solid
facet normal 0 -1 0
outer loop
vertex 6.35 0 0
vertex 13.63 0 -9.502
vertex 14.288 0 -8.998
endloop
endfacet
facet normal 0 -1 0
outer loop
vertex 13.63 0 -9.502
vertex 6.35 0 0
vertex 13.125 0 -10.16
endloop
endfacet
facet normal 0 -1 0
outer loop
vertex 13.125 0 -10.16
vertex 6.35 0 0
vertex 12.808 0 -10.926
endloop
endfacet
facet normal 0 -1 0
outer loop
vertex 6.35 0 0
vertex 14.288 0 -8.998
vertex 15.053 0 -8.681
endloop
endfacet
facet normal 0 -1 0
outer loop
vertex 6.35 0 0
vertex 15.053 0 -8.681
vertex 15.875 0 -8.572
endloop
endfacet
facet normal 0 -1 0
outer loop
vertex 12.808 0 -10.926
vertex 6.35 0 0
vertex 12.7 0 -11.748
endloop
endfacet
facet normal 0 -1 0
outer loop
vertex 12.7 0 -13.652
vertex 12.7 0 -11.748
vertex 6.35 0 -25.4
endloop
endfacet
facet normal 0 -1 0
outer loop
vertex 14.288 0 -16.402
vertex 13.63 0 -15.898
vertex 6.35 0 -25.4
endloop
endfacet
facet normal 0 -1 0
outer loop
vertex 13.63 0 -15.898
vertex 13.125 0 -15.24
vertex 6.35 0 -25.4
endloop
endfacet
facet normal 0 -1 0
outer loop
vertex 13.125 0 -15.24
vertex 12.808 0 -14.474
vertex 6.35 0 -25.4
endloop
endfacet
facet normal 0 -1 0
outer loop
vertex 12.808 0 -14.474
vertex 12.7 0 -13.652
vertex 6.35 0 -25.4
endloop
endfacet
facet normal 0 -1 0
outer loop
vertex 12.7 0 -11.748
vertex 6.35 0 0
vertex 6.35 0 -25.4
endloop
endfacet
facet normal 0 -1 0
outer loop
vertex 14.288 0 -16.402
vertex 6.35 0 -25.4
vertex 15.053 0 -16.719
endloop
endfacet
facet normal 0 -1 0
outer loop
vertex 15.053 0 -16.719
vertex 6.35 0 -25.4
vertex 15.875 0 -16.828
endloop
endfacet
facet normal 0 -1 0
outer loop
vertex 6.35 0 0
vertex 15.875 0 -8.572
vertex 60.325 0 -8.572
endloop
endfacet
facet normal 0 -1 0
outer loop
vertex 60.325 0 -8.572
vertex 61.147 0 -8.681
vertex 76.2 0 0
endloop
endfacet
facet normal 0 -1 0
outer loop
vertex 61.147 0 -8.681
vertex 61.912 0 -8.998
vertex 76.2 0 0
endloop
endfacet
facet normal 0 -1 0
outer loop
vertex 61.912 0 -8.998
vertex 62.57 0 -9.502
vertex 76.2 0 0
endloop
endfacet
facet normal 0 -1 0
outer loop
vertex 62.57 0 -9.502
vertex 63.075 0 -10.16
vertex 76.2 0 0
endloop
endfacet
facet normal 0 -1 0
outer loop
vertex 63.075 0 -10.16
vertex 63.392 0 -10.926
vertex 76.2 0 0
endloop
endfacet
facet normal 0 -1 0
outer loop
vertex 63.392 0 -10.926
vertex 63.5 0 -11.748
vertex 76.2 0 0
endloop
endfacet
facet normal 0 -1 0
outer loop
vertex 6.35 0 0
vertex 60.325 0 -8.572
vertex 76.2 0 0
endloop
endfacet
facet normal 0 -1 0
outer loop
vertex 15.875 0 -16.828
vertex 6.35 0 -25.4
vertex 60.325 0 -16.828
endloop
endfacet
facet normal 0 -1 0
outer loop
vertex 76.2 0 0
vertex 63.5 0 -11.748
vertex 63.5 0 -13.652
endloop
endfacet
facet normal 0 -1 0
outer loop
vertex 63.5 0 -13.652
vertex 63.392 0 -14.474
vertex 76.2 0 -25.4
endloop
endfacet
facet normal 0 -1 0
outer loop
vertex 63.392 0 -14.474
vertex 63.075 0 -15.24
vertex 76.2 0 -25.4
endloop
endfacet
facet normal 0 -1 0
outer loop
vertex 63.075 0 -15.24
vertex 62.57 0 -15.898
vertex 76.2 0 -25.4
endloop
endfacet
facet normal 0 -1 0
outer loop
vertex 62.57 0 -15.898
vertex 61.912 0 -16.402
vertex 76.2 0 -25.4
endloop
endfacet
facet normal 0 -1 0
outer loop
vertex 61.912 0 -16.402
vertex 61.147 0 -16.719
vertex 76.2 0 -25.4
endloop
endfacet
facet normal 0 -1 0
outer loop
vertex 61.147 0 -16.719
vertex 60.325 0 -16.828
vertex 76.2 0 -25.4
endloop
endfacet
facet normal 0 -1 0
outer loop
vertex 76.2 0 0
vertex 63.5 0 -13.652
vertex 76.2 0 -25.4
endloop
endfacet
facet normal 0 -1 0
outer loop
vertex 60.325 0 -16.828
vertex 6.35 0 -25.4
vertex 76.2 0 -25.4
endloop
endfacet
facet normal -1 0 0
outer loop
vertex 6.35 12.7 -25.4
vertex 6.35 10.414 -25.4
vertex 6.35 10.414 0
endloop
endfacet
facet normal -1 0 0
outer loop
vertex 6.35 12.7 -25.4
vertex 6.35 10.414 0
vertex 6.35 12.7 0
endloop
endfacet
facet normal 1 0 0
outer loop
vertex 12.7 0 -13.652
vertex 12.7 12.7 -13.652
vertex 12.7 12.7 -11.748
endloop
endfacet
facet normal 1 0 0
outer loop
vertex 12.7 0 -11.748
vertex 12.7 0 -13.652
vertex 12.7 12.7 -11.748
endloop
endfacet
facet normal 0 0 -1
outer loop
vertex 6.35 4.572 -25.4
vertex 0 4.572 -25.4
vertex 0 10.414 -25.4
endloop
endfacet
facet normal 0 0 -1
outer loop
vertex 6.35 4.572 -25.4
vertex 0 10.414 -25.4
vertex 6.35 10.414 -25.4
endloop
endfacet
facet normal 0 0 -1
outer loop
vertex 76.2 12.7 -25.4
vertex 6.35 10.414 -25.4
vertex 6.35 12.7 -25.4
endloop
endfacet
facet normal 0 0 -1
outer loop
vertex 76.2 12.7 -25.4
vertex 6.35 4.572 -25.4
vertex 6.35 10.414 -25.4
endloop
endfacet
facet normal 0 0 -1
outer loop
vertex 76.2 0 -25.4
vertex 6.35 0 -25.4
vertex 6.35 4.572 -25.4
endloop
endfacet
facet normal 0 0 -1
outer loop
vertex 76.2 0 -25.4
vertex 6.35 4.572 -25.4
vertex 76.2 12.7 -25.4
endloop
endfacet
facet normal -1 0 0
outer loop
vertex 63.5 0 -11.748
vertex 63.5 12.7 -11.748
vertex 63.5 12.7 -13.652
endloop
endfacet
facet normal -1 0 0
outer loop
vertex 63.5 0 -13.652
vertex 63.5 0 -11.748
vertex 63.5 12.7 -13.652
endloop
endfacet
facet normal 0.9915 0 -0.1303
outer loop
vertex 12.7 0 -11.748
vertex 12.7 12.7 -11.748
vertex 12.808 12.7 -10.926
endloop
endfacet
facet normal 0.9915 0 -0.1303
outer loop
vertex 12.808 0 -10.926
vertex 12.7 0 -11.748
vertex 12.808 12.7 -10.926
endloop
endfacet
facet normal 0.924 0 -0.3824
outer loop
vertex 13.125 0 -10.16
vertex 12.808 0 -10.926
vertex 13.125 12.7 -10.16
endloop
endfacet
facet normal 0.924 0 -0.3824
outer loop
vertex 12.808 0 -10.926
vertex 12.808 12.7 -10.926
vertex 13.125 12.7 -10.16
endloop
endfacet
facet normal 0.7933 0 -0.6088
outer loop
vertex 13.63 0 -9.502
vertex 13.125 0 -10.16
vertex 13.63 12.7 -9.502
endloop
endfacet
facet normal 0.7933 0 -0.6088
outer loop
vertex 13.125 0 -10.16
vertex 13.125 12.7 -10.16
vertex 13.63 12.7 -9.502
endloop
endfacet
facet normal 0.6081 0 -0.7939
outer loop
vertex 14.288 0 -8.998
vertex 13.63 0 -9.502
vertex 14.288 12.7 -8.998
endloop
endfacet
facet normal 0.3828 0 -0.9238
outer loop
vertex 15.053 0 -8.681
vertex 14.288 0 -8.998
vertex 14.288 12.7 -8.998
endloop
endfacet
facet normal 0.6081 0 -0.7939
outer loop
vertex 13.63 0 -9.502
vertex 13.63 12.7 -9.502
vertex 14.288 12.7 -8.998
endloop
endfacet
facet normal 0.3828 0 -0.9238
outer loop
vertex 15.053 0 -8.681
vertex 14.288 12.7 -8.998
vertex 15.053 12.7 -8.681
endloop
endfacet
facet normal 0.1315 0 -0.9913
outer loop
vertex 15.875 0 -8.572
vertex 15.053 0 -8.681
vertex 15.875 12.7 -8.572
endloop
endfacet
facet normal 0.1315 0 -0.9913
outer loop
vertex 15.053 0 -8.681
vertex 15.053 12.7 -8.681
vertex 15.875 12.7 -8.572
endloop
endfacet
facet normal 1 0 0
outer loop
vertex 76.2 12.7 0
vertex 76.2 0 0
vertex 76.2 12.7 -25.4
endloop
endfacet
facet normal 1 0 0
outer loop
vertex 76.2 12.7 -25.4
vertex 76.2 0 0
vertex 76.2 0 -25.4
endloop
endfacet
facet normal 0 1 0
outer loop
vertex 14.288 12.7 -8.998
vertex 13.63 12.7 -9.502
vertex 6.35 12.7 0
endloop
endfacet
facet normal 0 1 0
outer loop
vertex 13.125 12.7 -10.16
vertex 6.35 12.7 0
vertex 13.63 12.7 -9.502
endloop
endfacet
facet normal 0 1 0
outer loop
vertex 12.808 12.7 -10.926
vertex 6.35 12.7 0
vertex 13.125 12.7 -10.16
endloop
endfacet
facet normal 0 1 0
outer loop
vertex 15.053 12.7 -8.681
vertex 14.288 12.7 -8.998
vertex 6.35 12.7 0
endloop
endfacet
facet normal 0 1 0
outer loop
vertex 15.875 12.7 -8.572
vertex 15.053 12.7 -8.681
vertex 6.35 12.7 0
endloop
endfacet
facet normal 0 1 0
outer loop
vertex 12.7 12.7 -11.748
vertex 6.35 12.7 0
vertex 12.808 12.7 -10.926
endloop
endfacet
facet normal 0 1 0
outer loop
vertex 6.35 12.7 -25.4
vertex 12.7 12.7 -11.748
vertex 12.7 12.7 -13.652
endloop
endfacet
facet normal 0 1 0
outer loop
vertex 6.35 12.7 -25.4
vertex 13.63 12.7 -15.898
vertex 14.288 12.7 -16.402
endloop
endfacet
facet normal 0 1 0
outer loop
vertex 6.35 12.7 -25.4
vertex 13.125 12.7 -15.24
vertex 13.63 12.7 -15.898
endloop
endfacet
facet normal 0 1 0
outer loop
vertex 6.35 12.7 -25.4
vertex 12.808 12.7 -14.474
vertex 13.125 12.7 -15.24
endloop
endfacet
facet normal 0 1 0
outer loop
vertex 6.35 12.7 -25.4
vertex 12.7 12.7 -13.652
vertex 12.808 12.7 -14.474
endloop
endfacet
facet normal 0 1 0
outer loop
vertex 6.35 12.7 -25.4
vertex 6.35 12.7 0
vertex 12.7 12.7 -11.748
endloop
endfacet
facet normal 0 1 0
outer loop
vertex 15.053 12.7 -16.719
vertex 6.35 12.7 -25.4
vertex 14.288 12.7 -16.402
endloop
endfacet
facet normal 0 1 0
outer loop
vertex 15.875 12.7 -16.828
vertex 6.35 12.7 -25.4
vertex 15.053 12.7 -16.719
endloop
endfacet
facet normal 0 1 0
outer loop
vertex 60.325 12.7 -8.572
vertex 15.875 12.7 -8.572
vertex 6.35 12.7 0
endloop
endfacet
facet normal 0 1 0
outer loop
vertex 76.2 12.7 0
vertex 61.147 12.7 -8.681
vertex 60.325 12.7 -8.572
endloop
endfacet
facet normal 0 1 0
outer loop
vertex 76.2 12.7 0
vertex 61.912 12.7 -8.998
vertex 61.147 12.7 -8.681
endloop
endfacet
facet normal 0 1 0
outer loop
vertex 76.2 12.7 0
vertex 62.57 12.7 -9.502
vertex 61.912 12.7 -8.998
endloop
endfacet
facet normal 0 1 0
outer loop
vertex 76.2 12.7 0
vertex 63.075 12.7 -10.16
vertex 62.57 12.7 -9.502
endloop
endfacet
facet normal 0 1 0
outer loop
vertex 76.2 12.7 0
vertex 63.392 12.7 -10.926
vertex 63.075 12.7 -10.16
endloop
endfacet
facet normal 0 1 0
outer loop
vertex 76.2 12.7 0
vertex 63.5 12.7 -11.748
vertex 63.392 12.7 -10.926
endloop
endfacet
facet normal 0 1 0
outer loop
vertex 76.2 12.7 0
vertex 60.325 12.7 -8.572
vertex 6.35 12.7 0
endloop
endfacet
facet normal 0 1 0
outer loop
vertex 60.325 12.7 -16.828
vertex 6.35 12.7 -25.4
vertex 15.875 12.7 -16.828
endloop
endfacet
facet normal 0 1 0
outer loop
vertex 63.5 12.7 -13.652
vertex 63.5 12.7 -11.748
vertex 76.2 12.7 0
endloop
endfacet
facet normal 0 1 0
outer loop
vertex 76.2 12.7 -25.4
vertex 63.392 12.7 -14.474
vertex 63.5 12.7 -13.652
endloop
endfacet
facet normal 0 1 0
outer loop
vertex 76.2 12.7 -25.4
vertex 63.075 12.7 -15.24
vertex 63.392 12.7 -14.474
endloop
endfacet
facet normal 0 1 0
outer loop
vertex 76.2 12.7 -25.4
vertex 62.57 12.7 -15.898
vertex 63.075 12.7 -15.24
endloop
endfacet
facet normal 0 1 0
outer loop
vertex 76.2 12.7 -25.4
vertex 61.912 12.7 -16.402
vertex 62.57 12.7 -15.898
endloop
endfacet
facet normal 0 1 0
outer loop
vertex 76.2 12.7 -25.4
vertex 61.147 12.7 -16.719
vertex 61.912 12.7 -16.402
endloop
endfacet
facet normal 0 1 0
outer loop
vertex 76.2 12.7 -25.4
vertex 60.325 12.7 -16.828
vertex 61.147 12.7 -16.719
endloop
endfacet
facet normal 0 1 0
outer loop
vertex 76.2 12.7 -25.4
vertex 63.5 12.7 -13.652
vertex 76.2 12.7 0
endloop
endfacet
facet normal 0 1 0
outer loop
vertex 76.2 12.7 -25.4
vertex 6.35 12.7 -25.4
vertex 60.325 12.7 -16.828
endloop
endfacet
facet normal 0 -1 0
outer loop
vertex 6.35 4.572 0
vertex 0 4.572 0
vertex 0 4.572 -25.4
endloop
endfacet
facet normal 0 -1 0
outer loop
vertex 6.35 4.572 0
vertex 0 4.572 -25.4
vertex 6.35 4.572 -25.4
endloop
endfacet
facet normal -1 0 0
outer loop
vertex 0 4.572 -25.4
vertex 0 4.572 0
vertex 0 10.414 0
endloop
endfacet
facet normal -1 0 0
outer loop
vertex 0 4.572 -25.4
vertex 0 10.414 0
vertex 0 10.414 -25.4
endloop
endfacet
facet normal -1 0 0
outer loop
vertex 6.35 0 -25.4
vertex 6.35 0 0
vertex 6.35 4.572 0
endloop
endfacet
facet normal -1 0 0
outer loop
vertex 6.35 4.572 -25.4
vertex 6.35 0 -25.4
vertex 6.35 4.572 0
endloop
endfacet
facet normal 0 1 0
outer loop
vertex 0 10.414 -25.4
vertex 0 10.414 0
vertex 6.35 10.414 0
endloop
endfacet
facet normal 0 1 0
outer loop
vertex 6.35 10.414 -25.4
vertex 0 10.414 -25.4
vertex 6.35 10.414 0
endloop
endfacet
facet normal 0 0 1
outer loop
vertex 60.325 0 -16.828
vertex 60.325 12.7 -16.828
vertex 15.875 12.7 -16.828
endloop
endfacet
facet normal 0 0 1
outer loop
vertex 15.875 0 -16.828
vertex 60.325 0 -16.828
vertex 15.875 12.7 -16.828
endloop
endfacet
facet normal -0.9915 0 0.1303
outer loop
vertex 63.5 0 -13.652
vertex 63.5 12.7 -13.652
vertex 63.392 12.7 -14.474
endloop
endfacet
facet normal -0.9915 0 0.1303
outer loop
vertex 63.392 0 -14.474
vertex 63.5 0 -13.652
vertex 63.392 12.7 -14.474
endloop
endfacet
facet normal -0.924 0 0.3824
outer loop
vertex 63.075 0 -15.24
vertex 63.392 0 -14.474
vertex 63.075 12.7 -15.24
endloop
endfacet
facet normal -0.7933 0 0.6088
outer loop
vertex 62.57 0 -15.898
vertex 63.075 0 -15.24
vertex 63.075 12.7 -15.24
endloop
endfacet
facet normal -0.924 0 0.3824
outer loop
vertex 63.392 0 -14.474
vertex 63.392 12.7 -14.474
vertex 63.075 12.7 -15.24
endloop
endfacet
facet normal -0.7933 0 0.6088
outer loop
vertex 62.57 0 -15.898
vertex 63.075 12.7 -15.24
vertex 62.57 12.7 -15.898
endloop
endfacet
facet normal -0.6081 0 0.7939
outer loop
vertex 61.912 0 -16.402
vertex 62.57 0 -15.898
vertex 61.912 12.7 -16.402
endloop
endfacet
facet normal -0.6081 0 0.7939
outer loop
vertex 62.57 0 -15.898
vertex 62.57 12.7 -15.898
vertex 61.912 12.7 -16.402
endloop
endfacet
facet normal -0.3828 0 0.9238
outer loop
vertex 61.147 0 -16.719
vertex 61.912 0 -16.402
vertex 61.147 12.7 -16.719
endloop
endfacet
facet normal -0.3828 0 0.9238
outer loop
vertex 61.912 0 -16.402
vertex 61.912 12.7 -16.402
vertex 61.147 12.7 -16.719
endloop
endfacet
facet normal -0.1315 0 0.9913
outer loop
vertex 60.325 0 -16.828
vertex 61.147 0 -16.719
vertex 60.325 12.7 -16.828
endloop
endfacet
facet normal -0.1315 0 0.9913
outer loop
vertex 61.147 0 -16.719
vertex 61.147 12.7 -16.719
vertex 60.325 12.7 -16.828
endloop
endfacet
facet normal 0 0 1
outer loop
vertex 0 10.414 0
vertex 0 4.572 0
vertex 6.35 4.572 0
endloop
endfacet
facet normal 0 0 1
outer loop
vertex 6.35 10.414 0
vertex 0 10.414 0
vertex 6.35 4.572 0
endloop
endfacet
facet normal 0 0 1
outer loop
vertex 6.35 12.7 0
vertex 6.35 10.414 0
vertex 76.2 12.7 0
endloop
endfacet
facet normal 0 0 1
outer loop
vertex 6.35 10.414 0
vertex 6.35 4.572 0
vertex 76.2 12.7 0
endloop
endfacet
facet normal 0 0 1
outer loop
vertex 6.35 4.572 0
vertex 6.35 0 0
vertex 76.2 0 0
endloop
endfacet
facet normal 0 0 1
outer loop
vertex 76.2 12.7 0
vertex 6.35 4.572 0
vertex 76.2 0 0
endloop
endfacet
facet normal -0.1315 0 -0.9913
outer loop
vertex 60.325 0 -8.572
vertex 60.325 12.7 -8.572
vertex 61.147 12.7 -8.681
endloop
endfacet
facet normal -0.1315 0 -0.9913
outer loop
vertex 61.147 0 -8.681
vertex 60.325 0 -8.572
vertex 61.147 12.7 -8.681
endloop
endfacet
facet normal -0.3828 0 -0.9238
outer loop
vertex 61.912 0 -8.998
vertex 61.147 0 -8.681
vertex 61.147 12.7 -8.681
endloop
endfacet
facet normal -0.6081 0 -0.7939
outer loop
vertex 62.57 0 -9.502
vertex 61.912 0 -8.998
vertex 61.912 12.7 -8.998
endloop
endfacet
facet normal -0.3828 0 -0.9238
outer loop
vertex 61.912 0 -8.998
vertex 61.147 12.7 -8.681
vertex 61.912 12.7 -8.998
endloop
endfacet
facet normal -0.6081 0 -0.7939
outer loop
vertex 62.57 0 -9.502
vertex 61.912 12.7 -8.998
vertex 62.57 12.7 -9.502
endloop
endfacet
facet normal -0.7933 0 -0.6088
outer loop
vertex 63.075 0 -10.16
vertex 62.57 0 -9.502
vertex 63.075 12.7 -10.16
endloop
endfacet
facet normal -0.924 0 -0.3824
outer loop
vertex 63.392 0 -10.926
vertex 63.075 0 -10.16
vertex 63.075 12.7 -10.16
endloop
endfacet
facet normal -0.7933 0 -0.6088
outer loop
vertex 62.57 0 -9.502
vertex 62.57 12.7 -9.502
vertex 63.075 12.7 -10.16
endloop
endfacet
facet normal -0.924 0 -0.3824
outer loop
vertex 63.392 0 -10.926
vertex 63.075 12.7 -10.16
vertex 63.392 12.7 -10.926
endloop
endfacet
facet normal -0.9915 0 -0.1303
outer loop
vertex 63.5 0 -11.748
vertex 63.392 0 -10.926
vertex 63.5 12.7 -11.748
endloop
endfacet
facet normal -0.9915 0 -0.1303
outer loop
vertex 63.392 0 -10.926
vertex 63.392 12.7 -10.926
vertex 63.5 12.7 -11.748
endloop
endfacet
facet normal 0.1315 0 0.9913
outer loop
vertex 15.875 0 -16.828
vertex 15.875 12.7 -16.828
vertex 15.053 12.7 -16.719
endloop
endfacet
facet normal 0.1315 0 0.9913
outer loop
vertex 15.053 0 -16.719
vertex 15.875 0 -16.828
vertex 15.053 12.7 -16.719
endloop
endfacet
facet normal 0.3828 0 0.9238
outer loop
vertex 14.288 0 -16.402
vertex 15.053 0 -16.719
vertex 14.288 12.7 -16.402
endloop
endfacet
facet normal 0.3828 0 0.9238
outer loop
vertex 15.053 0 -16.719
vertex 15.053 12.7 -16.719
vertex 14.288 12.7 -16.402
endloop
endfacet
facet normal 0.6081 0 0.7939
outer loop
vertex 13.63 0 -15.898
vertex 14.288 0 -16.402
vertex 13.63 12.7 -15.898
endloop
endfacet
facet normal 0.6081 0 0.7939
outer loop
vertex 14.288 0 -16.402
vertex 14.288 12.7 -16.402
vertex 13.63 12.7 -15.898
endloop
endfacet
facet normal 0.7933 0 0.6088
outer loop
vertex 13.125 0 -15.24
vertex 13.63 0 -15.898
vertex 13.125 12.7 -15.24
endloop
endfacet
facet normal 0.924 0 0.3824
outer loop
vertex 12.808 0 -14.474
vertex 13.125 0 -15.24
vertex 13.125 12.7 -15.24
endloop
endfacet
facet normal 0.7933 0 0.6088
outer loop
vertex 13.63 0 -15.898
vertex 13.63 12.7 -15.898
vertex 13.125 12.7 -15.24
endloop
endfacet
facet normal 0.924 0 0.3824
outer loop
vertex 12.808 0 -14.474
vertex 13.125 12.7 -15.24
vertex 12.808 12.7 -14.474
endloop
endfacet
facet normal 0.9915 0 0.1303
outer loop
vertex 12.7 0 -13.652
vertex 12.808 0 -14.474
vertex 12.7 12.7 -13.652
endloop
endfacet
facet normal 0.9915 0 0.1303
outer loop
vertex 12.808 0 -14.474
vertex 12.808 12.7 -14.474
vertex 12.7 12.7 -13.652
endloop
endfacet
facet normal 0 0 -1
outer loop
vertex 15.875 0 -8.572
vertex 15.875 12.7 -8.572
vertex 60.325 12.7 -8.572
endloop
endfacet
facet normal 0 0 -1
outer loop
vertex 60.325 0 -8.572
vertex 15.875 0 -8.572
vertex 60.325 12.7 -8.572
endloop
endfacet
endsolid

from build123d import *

# Parameters (mm, degrees)
SKETCH1_W           = 76.2
SKETCH1_H           = 25.4
BOSS_EXTRUDE1_DEPTH = 12.7
CUT_EXTRUDE1_DEPTH  = 13.7
SKETCH4_W           = 6.35
SKETCH4_H           = 4.572
SKETCH4_H_2         = 2.286
CUT_EXTRUDE2_DEPTH  = 26.4


with BuildPart() as part:
    # Sketch1 → Boss-Extrude1 (new body)
    with BuildSketch(Plane(origin=(0, 0, 0), x_dir=(1, 0, 0), z_dir=(0, 1, 0))):
        with Locations((38.1, 12.7)):
            Rectangle(SKETCH1_W, SKETCH1_H)
    extrude(amount=BOSS_EXTRUDE1_DEPTH)

    # Sketch3 → Cut-Extrude1 (cut, through all)
    with BuildSketch(Plane(origin=(0, 12.7, 0), x_dir=(1, 0, 0), z_dir=(0, 1, 0))):
        with BuildLine():
            Line((15.875, 8.5725), (60.325, 8.5725))
            ThreePointArc((60.325, 8.5725), (62.57006403, 9.50243597), (63.5, 11.7475))
            Line((63.5, 11.7475), (63.5, 13.6525))
            ThreePointArc((63.5, 13.6525), (62.57006403, 15.89756403), (60.325, 16.8275))
            Line((60.325, 16.8275), (15.875, 16.8275))
            ThreePointArc((15.875, 16.8275), (13.62993597, 15.89756403), (12.7, 13.6525))
            Line((12.7, 13.6525), (12.7, 11.7475))
            ThreePointArc((12.7, 11.7475), (13.62993597, 9.50243597), (15.875, 8.5725))
        make_face()
    extrude(amount=-CUT_EXTRUDE1_DEPTH, mode=Mode.SUBTRACT)

    # Sketch4 → Cut-Extrude2 (cut, through all)
    with BuildSketch(Plane.XY):
        with Locations((3.175, 2.286)):
            Rectangle(SKETCH4_W, SKETCH4_H)
        with Locations((3.175, 11.557)):
            Rectangle(SKETCH4_W, SKETCH4_H_2)
    extrude(amount=-CUT_EXTRUDE2_DEPTH, mode=Mode.SUBTRACT)


solid = part.part
